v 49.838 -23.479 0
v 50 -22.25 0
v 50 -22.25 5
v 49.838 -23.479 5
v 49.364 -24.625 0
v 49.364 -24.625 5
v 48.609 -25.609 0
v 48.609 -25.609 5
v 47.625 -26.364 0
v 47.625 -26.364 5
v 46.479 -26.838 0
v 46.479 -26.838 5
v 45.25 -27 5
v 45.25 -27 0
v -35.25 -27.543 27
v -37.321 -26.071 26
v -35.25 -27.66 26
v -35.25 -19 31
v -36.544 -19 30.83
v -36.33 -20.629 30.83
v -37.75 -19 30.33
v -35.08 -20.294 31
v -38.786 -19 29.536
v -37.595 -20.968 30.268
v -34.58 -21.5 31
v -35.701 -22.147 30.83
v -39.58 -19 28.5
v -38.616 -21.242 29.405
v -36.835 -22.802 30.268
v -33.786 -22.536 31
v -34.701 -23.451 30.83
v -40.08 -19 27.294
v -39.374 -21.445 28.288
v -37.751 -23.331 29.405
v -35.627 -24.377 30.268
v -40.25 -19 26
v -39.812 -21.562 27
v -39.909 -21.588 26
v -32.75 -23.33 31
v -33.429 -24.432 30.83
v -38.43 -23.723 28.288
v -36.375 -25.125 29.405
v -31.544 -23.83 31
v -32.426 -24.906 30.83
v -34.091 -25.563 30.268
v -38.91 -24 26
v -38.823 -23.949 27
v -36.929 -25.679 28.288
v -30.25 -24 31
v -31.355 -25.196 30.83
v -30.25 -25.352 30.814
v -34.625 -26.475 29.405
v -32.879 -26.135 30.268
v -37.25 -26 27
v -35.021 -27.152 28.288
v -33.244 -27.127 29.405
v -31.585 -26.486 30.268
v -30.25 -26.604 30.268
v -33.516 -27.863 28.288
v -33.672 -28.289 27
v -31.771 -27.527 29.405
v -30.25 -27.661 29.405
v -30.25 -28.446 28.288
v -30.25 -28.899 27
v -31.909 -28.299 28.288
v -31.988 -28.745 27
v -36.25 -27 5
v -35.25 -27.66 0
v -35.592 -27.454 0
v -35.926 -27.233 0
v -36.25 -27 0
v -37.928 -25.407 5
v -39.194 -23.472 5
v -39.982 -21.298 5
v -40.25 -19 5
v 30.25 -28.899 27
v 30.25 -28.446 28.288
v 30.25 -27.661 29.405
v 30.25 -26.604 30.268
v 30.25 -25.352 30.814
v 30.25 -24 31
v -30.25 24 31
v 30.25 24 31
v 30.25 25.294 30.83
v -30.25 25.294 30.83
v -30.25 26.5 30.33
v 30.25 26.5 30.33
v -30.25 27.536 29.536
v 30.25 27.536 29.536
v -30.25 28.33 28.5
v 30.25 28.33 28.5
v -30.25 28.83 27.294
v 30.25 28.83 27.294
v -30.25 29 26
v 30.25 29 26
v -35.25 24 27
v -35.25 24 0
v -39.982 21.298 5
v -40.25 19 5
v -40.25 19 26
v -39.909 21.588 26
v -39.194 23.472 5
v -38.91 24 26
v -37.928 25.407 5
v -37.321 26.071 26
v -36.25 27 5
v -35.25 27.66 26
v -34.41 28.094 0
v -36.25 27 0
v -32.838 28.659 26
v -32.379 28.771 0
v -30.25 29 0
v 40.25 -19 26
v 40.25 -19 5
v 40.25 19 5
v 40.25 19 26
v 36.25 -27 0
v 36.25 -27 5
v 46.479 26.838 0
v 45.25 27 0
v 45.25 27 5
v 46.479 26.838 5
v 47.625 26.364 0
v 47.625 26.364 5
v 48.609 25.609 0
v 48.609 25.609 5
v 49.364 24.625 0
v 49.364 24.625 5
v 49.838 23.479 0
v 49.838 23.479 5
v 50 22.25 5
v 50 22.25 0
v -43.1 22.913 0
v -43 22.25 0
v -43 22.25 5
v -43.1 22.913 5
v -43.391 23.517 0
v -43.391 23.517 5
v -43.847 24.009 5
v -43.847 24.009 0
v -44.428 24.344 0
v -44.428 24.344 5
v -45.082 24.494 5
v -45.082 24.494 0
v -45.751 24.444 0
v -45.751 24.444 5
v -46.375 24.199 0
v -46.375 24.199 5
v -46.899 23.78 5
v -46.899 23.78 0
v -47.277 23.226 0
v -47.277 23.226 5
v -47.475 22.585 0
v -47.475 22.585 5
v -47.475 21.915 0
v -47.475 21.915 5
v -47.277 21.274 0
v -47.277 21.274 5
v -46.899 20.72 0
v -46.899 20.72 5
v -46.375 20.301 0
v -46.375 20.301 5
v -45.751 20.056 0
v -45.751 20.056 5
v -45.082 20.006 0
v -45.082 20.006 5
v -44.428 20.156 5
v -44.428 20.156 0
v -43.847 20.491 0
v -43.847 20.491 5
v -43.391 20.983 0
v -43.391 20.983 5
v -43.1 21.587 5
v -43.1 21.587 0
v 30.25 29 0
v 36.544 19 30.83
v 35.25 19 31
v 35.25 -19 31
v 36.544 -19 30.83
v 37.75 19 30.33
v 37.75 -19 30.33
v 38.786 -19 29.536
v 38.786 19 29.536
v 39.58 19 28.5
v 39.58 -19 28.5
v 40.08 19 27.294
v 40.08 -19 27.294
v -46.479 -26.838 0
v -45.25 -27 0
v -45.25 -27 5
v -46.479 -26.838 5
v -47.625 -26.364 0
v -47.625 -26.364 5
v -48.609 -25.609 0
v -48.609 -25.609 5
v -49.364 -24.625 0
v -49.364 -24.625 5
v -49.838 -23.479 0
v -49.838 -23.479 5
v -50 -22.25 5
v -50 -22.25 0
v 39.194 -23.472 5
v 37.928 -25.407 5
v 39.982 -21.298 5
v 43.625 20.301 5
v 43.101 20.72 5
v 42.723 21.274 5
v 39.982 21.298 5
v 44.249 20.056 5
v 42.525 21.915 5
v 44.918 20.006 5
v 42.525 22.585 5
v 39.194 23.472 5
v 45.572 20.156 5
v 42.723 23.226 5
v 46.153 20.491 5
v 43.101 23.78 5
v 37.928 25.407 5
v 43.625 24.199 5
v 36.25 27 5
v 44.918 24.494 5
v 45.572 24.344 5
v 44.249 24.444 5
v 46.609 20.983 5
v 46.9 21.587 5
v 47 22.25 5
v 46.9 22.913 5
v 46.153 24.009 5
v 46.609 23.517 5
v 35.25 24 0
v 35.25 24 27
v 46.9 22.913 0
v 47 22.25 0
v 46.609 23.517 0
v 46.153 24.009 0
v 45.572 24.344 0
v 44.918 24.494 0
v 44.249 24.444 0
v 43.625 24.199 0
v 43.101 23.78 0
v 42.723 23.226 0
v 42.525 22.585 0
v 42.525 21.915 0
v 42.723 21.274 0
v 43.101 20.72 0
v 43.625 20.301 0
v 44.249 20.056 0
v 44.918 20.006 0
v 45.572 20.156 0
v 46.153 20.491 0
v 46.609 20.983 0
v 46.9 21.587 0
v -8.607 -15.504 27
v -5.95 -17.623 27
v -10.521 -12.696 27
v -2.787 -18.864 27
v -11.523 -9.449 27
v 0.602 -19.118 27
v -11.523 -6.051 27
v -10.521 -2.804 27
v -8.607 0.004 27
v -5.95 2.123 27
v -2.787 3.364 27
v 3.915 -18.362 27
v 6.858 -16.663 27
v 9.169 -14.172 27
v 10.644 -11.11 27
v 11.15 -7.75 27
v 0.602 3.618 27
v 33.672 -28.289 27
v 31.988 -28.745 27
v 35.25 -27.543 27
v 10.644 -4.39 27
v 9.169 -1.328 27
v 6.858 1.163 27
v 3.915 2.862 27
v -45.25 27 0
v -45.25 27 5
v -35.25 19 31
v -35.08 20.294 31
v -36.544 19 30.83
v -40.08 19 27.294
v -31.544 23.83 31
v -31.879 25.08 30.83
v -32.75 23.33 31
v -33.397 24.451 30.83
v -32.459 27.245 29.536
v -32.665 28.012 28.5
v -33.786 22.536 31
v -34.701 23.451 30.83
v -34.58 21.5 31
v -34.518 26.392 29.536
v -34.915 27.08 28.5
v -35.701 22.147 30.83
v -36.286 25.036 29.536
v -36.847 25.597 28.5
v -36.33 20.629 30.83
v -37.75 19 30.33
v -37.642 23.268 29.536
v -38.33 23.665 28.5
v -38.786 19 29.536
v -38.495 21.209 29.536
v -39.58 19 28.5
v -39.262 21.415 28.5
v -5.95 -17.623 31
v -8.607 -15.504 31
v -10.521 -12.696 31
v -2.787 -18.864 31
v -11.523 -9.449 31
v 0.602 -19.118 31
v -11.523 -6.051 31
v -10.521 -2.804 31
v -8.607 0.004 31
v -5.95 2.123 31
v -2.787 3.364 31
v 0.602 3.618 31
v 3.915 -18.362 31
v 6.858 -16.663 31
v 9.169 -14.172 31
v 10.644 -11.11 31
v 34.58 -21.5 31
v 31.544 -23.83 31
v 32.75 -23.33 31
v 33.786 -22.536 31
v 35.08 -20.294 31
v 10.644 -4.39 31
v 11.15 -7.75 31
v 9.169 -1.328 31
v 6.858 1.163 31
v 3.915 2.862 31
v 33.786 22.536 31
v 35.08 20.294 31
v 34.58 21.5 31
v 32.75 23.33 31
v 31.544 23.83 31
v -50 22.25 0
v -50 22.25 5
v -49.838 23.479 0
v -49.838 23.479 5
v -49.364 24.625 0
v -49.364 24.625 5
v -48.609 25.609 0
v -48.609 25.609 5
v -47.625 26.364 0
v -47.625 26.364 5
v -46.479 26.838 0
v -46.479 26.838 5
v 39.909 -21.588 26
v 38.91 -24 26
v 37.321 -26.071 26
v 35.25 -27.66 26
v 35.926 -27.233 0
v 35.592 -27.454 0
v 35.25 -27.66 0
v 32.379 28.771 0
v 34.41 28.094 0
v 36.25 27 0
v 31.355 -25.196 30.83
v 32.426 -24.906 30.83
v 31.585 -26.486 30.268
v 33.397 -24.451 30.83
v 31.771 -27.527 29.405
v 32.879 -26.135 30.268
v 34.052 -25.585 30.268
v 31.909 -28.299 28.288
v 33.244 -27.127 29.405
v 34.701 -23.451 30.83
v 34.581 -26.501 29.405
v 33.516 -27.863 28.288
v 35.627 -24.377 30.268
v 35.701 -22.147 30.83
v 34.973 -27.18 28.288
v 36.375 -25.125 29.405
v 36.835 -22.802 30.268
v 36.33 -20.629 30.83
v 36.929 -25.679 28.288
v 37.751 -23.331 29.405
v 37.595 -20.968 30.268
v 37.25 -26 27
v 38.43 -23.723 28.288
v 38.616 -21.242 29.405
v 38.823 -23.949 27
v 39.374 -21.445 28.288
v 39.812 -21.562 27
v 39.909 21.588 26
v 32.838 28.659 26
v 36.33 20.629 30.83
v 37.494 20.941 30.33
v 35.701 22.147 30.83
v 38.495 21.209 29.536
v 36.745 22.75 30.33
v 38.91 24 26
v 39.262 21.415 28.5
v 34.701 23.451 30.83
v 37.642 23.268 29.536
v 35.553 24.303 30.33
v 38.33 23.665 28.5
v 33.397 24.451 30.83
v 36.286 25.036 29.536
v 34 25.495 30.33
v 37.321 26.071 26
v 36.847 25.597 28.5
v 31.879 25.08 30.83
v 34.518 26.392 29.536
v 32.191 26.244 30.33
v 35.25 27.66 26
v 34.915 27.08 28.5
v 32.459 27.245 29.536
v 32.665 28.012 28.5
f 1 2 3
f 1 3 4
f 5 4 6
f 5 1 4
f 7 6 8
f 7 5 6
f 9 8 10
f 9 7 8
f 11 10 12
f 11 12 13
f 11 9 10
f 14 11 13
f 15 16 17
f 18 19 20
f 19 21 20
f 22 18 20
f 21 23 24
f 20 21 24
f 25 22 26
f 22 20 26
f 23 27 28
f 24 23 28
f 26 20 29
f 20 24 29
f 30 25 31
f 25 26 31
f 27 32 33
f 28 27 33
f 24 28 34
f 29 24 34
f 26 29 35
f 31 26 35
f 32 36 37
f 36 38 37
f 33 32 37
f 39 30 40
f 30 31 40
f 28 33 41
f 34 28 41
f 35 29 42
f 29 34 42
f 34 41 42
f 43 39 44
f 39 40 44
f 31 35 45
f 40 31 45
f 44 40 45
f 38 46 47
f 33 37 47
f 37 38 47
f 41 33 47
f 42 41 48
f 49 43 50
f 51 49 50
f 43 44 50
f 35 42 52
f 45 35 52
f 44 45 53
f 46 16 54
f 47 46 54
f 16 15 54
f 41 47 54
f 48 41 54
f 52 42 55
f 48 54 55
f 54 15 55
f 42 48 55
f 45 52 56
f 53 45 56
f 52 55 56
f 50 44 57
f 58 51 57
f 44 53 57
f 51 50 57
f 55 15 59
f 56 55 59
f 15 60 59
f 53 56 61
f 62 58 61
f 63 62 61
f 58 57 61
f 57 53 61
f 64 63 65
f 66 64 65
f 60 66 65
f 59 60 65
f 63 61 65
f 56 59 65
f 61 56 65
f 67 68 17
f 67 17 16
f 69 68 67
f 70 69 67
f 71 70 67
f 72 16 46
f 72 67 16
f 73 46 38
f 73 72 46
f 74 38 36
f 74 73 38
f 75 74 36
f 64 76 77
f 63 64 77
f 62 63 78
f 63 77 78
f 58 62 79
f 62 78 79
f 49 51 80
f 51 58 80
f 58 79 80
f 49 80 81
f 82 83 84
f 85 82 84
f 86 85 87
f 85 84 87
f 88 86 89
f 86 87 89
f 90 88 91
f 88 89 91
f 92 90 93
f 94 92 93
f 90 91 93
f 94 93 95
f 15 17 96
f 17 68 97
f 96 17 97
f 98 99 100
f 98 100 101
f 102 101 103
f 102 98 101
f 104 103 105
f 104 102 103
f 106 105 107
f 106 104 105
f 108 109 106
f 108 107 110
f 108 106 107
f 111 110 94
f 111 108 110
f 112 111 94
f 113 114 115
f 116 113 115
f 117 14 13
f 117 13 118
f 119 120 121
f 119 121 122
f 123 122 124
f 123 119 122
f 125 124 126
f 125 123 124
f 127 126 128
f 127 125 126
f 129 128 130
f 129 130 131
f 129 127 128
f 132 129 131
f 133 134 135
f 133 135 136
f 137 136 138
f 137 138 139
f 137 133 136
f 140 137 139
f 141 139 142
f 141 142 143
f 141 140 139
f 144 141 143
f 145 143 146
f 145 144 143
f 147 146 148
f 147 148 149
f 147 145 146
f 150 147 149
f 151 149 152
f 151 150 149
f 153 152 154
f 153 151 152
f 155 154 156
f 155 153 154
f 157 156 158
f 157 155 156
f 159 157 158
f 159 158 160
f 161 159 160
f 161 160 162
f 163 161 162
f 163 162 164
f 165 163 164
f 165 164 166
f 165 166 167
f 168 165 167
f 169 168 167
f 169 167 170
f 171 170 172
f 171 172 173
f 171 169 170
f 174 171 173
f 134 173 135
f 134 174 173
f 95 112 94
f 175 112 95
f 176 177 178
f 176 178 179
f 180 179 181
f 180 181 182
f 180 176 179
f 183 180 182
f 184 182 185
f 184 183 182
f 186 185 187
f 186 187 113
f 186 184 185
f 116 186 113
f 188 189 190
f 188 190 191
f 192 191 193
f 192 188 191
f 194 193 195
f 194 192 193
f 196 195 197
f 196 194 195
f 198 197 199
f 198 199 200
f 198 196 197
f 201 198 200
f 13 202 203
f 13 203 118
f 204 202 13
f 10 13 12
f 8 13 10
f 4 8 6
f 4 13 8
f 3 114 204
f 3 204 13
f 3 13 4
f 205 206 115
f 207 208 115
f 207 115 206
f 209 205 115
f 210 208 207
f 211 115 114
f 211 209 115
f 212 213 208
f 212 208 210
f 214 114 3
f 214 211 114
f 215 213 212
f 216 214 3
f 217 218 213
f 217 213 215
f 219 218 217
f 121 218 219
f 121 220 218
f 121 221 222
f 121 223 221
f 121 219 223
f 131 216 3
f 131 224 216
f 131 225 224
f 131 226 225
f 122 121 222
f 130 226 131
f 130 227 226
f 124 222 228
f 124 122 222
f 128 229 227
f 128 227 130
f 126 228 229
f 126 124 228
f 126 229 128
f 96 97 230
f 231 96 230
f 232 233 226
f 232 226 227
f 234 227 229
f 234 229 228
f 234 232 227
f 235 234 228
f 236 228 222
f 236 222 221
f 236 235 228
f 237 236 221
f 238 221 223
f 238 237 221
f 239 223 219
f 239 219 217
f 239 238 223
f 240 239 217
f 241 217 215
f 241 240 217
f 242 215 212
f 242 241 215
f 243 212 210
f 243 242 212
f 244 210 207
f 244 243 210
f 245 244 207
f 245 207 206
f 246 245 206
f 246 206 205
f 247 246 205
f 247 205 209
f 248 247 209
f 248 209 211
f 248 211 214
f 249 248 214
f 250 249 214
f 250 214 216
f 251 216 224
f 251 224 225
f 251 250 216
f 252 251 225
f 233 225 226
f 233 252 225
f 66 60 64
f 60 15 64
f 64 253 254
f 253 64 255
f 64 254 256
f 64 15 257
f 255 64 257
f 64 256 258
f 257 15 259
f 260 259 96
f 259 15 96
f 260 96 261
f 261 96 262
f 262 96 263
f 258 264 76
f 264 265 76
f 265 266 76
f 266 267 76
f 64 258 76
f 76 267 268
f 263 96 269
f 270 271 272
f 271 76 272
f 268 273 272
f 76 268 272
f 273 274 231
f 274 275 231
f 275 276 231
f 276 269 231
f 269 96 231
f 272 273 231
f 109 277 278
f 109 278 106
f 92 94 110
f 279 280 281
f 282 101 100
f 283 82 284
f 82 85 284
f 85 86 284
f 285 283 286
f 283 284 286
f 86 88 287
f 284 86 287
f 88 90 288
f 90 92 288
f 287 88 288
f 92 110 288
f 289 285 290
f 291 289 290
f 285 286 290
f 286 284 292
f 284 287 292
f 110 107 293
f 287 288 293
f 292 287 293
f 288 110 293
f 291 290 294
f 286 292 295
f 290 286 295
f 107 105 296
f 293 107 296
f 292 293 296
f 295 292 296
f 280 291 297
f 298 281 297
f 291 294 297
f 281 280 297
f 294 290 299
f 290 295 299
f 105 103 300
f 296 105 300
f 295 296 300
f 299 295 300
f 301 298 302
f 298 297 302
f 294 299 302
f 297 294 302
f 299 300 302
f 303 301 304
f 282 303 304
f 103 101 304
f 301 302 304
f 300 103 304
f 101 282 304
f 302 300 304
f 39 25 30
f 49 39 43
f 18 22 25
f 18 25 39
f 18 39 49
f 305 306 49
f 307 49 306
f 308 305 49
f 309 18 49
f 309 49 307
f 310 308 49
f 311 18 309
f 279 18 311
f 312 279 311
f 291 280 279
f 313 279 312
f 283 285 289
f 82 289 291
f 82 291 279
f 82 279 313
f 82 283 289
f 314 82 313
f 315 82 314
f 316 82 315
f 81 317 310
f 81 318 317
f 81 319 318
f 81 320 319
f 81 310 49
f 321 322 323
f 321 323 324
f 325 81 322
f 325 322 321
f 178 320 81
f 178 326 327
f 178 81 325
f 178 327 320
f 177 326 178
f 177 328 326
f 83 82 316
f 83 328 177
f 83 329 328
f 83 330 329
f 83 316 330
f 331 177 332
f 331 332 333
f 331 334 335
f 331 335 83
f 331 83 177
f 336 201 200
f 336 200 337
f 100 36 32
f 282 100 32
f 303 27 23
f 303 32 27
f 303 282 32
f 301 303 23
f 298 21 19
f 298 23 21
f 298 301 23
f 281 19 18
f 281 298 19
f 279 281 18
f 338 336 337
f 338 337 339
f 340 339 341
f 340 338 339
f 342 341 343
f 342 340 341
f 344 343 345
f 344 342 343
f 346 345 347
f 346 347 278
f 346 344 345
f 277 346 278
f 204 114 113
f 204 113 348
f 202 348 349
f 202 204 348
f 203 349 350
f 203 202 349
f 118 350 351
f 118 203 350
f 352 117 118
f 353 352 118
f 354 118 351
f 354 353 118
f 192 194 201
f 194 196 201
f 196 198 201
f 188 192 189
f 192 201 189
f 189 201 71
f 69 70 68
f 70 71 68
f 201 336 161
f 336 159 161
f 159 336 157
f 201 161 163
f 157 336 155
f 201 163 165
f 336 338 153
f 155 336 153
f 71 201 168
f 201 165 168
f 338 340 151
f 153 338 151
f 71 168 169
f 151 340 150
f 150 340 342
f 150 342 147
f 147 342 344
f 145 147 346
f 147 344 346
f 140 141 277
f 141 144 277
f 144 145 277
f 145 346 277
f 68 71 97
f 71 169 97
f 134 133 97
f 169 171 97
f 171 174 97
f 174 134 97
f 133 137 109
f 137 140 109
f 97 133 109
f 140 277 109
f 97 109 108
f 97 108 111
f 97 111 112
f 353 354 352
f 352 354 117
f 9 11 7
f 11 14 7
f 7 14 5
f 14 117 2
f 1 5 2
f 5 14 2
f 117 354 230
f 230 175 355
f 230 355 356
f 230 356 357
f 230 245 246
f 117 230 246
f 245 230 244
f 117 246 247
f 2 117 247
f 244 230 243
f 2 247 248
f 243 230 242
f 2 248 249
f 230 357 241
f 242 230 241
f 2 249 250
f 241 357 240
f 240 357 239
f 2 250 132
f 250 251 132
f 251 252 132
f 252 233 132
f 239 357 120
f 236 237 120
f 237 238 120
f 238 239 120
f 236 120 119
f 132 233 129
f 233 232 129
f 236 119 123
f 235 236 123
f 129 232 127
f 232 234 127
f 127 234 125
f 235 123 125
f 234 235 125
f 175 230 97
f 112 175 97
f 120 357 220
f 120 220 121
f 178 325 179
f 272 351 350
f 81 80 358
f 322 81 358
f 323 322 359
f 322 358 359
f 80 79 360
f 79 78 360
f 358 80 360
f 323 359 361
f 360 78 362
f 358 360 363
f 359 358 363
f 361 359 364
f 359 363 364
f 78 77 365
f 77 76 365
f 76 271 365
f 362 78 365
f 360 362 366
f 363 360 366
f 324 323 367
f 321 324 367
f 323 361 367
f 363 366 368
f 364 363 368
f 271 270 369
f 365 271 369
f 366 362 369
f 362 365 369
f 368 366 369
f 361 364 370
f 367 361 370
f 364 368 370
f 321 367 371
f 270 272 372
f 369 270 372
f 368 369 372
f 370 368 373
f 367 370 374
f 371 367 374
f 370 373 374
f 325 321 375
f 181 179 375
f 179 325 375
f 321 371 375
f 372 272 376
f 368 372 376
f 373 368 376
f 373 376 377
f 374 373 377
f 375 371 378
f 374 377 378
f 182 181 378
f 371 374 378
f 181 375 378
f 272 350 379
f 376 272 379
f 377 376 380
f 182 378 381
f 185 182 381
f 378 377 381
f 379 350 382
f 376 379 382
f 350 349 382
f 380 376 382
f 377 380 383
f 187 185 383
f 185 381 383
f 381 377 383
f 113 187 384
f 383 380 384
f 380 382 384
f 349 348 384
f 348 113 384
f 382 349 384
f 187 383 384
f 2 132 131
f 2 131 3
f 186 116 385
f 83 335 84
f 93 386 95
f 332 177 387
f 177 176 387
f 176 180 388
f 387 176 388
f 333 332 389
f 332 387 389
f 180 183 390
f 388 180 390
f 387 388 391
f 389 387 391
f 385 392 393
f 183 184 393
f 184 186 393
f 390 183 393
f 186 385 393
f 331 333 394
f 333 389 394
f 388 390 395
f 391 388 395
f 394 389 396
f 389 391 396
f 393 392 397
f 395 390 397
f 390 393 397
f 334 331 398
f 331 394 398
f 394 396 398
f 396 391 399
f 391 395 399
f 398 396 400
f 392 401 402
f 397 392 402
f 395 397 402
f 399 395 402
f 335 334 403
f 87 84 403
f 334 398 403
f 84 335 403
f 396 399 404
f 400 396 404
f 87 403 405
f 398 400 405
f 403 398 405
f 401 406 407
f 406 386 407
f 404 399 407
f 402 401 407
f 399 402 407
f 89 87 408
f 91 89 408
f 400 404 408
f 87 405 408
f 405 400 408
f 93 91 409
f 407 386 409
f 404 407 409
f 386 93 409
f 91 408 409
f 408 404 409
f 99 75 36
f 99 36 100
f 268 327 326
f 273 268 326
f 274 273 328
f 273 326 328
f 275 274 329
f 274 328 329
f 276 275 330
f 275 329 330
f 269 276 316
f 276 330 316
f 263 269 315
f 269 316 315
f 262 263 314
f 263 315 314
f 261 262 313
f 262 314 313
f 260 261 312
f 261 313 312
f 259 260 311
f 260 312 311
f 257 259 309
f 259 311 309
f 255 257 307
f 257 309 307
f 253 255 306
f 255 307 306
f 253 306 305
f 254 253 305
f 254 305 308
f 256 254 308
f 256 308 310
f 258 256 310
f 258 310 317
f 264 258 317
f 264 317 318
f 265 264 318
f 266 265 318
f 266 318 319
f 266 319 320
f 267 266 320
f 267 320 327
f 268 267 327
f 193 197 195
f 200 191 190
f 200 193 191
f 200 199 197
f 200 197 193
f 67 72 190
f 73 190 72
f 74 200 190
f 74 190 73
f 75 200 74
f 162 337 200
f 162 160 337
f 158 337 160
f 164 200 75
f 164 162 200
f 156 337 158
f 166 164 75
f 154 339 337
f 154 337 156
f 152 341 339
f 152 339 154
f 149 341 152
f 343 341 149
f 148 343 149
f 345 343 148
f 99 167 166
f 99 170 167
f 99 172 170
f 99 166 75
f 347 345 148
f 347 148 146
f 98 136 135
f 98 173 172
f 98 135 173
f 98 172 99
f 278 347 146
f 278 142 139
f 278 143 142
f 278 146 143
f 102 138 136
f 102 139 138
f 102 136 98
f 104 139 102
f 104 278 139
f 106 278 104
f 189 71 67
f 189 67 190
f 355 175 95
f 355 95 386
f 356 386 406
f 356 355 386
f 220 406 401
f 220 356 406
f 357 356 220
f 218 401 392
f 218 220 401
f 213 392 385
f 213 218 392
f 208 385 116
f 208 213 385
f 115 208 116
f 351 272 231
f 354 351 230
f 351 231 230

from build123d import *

# Parameters (mm, degrees)
CROQUIS1_R              = 2.25
CROQUIS1_W              = 70.5
CROQUIS1_H              = 48
SALIENTE_EXTRUIR1_DEPTH = 5
CROQUIS1_3_W            = 80.5
CROQUIS1_3_H            = 2
CROQUIS1_3_H_2          = 54
CROQUIS1_3_W_2          = 70.5
CROQUIS1_3_H_3          = 48
SALIENTE_EXTRUIR2_DEPTH = 31
CROQUIS1_5_W            = 70.5
CROQUIS1_5_H            = 48
CORTAR_EXTRUIR2_DEPTH   = 27
REDONDEO4_R             = 5
REDONDEO5_START         = 5
REDONDEO5_DEPTH         = 26
REDONDEO5_START_2       = -1
REDONDEO5_2_DEPTH       = 8.65388
REDONDEO5_3_ANGLE       = 90
REDONDEO5_4_ANGLE       = 90
REDONDEO5_5_ANGLE       = 90
REDONDEO5_6_ANGLE       = 90
CROQUIS3_W              = 70.5
CROQUIS3_H              = 27
CORTAR_EXTRUIR5_DEPTH   = 80.183331618
CROQUIS4_R              = 11.399999943
CORTAR_EXTRUIR6_DEPTH   = 10


with BuildPart() as part:
    # Croquis1 → Saliente-Extruir1 (new body)
    with BuildSketch(Plane.XY):
        with BuildLine():
            Line((-45.25, 27), (45.25, 27))
            ThreePointArc((45.25, 27), (48.608757211, 25.608757211), (50, 22.25))
            Line((50, 22.25), (50, -22.25))
            ThreePointArc((50, -22.25), (48.608757211, -25.608757211), (45.25, -27))
            Line((45.25, -27), (-45.25, -27))
            ThreePointArc((-45.25, -27), (-48.608757211, -25.608757211), (-50, -22.25))
            Line((-50, -22.25), (-50, 22.25))
            ThreePointArc((-50, 22.25), (-48.608757211, 25.608757211), (-45.25, 27))
        make_face()
        with Locations((-45.25, 22.25)):
            Circle(CROQUIS1_R, mode=Mode.SUBTRACT)
        with Locations((44.75000048, 22.250001182)):
            Circle(CROQUIS1_R, mode=Mode.SUBTRACT)
        Rectangle(CROQUIS1_W, CROQUIS1_H, mode=Mode.SUBTRACT)
    extrude(amount=SALIENTE_EXTRUIR1_DEPTH)

    # Croquis1<3> → Saliente-Extruir2 (add)
    # profile 1 of 4: a face of its own
    with BuildSketch(Plane.XY):
        with Locations((0, 28)):
            Rectangle(CROQUIS1_3_W, CROQUIS1_3_H)
    # profile 2 of 4: a face of its own
    with BuildSketch(Plane.XY):
        Rectangle(CROQUIS1_3_W, CROQUIS1_3_H_2)
        Rectangle(CROQUIS1_3_W_2, CROQUIS1_3_H_3, mode=Mode.SUBTRACT)
    # profile 3 of 4: a face of its own
    with BuildSketch(Plane.XY):
        Rectangle(CROQUIS1_3_W_2, CROQUIS1_3_H_3)
    # profile 4 of 4: a face of its own
    with BuildSketch(Plane.XY):
        with Locations((0, -28)):
            Rectangle(CROQUIS1_3_W, CROQUIS1_3_H)
    extrude(amount=SALIENTE_EXTRUIR2_DEPTH)

    # Croquis1<5> → Cortar-Extruir2 (cut)
    with BuildSketch(Plane.XY):
        Rectangle(CROQUIS1_5_W, CROQUIS1_5_H)
    extrude(amount=CORTAR_EXTRUIR2_DEPTH, mode=Mode.SUBTRACT)

    # Redondeo4
    redondeo4_edges = [part.edges().sort_by_distance(p)[0] for p in [
        (40.25, 0, 31),
        (0, 29, 31),
        (-40.25, 0, 31),
        (0, -29, 31),
    ]]
    fillet(redondeo4_edges, radius=REDONDEO4_R)

    # Redondeo5: read off the stored shape, not the designer's step
    # Redondeo5 outline → Redondeo5 (cut)
    with BuildSketch(Plane.XY.offset(REDONDEO5_START)):
        with BuildLine():
            ThreePointArc((-40.25, 19), (-37.321067812, 26.071067812), (-30.25, 29))
            Line((-30.25, 29), (-40.25, 29))
            Line((-40.25, 29), (-40.25, 19))
        make_face()
        with BuildLine():
            Line((40.25, 29), (30.25, 29))
            ThreePointArc((30.25, 29), (37.321067812, 26.071067812), (40.25, 19))
            Line((40.25, 19), (40.25, 29))
        make_face()
        with BuildLine():
            Line((-40.25, -19), (-40.25, -29))
            Line((-40.25, -29), (-30.25, -29))
            ThreePointArc((-30.25, -29), (-37.321067812, -26.071067812), (-40.25, -19))
        make_face()
        with BuildLine():
            ThreePointArc((40.25, -19), (37.321067812, -26.071067812), (30.25, -29))
            Line((30.25, -29), (40.25, -29))
            Line((40.25, -29), (40.25, -19))
        make_face()
    extrude(amount=REDONDEO5_DEPTH, mode=Mode.SUBTRACT)

    # Redondeo5 2 outline → Redondeo5 2 (cut)
    with BuildSketch(Plane.XY.offset(REDONDEO5_START_2)):
        with BuildLine():
            Line((-40.25, 27), (-36.25, 27))
            ThreePointArc((-36.25, 27), (-33.41227766, 28.486832981), (-30.25, 29))
            Line((-30.25, 29), (-40.25, 29))
            Line((-40.25, 29), (-40.25, 27))
        make_face()
        with BuildLine():
            Line((40.25, 29), (30.25, 29))
            ThreePointArc((30.25, 29), (33.41227766, 28.486832981), (36.25, 27))
            Line((36.25, 27), (40.25, 27))
            Line((40.25, 27), (40.25, 29))
        make_face()
        with BuildLine():
            ThreePointArc((-30.25, -29), (-33.41227766, -28.486832981), (-36.25, -27))
            Line((-36.25, -27), (-40.25, -27))
            Line((-40.25, -27), (-40.25, -29))
            Line((-40.25, -29), (-30.25, -29))
        make_face()
        with BuildLine():
            ThreePointArc((36.25, -27), (33.41227766, -28.486832981), (30.25, -29))
            Line((30.25, -29), (40.25, -29))
            Line((40.25, -29), (40.25, -27))
            Line((40.25, -27), (36.25, -27))
        make_face()
    extrude(amount=REDONDEO5_2_DEPTH, mode=Mode.SUBTRACT)

    # Redondeo5 3 outline → Redondeo5 3 (revolve, cut)
    with BuildSketch(Plane(origin=(30.25, 19, 0), x_dir=(1, 0, 0), z_dir=(0, -1, 0))):
        with BuildLine():
            ThreePointArc((5, 31), (8.535533906, 29.535533906), (10, 26))
            Line((10, 26), (10, 31))
            Line((10, 31), (5, 31))
        make_face()
    revolve(axis=Axis((30.25, 19, 0), (0, 0, 1)), revolution_arc=REDONDEO5_3_ANGLE, mode=Mode.SUBTRACT)

    # Redondeo5 4 outline → Redondeo5 4 (revolve, cut)
    with BuildSketch(Plane(origin=(-30.25, 19, 0), x_dir=(0, 1, 0), z_dir=(1, 0, 0))):
        with BuildLine():
            ThreePointArc((5, 31), (8.535533906, 29.535533906), (10, 26))
            Line((10, 26), (10, 31))
            Line((10, 31), (5, 31))
        make_face()
    revolve(axis=Axis((-30.25, 19, 0), (0, 0, 1)), revolution_arc=REDONDEO5_4_ANGLE, mode=Mode.SUBTRACT)

    # Redondeo5 5 outline → Redondeo5 5 (revolve, cut)
    with BuildSketch(Plane(origin=(-30.25, -19, 0), x_dir=(-1, 0, 0), z_dir=(0, 1, 0))):
        with BuildLine():
            ThreePointArc((5, 31), (8.535533906, 29.535533906), (10, 26))
            Line((10, 26), (10, 31))
            Line((10, 31), (5, 31))
        make_face()
    revolve(axis=Axis((-30.25, -19, 0), (0, 0, 1)), revolution_arc=REDONDEO5_5_ANGLE, mode=Mode.SUBTRACT)

    # Redondeo5 6 outline → Redondeo5 6 (revolve, cut)
    with BuildSketch(Plane(origin=(30.25, -19, 0), x_dir=(0, -1, 0), z_dir=(-1, 0, 0))):
        with BuildLine():
            ThreePointArc((5, 31), (8.535533906, 29.535533906), (10, 26))
            Line((10, 26), (10, 31))
            Line((10, 31), (5, 31))
        make_face()
    revolve(axis=Axis((30.25, -19, 0), (0, 0, 1)), revolution_arc=REDONDEO5_6_ANGLE, mode=Mode.SUBTRACT)

    # Croquis3 → Cortar-Extruir5 (cut, through all)
    with BuildSketch(Plane(origin=(0, -24, 0), x_dir=(1, 0, 0), z_dir=(0, 1, 0))):
        with Locations((0, -13.5)):
            Rectangle(CROQUIS3_W, CROQUIS3_H)
    extrude(amount=-CORTAR_EXTRUIR5_DEPTH, mode=Mode.SUBTRACT)

    # Croquis4 → Cortar-Extruir6 (cut)
    with BuildSketch(Plane.XY.offset(31)):
        with Locations((-0.24999952, -7.749998818)):
            Circle(CROQUIS4_R)
    extrude(amount=-CORTAR_EXTRUIR6_DEPTH, mode=Mode.SUBTRACT)


solid = part.part
